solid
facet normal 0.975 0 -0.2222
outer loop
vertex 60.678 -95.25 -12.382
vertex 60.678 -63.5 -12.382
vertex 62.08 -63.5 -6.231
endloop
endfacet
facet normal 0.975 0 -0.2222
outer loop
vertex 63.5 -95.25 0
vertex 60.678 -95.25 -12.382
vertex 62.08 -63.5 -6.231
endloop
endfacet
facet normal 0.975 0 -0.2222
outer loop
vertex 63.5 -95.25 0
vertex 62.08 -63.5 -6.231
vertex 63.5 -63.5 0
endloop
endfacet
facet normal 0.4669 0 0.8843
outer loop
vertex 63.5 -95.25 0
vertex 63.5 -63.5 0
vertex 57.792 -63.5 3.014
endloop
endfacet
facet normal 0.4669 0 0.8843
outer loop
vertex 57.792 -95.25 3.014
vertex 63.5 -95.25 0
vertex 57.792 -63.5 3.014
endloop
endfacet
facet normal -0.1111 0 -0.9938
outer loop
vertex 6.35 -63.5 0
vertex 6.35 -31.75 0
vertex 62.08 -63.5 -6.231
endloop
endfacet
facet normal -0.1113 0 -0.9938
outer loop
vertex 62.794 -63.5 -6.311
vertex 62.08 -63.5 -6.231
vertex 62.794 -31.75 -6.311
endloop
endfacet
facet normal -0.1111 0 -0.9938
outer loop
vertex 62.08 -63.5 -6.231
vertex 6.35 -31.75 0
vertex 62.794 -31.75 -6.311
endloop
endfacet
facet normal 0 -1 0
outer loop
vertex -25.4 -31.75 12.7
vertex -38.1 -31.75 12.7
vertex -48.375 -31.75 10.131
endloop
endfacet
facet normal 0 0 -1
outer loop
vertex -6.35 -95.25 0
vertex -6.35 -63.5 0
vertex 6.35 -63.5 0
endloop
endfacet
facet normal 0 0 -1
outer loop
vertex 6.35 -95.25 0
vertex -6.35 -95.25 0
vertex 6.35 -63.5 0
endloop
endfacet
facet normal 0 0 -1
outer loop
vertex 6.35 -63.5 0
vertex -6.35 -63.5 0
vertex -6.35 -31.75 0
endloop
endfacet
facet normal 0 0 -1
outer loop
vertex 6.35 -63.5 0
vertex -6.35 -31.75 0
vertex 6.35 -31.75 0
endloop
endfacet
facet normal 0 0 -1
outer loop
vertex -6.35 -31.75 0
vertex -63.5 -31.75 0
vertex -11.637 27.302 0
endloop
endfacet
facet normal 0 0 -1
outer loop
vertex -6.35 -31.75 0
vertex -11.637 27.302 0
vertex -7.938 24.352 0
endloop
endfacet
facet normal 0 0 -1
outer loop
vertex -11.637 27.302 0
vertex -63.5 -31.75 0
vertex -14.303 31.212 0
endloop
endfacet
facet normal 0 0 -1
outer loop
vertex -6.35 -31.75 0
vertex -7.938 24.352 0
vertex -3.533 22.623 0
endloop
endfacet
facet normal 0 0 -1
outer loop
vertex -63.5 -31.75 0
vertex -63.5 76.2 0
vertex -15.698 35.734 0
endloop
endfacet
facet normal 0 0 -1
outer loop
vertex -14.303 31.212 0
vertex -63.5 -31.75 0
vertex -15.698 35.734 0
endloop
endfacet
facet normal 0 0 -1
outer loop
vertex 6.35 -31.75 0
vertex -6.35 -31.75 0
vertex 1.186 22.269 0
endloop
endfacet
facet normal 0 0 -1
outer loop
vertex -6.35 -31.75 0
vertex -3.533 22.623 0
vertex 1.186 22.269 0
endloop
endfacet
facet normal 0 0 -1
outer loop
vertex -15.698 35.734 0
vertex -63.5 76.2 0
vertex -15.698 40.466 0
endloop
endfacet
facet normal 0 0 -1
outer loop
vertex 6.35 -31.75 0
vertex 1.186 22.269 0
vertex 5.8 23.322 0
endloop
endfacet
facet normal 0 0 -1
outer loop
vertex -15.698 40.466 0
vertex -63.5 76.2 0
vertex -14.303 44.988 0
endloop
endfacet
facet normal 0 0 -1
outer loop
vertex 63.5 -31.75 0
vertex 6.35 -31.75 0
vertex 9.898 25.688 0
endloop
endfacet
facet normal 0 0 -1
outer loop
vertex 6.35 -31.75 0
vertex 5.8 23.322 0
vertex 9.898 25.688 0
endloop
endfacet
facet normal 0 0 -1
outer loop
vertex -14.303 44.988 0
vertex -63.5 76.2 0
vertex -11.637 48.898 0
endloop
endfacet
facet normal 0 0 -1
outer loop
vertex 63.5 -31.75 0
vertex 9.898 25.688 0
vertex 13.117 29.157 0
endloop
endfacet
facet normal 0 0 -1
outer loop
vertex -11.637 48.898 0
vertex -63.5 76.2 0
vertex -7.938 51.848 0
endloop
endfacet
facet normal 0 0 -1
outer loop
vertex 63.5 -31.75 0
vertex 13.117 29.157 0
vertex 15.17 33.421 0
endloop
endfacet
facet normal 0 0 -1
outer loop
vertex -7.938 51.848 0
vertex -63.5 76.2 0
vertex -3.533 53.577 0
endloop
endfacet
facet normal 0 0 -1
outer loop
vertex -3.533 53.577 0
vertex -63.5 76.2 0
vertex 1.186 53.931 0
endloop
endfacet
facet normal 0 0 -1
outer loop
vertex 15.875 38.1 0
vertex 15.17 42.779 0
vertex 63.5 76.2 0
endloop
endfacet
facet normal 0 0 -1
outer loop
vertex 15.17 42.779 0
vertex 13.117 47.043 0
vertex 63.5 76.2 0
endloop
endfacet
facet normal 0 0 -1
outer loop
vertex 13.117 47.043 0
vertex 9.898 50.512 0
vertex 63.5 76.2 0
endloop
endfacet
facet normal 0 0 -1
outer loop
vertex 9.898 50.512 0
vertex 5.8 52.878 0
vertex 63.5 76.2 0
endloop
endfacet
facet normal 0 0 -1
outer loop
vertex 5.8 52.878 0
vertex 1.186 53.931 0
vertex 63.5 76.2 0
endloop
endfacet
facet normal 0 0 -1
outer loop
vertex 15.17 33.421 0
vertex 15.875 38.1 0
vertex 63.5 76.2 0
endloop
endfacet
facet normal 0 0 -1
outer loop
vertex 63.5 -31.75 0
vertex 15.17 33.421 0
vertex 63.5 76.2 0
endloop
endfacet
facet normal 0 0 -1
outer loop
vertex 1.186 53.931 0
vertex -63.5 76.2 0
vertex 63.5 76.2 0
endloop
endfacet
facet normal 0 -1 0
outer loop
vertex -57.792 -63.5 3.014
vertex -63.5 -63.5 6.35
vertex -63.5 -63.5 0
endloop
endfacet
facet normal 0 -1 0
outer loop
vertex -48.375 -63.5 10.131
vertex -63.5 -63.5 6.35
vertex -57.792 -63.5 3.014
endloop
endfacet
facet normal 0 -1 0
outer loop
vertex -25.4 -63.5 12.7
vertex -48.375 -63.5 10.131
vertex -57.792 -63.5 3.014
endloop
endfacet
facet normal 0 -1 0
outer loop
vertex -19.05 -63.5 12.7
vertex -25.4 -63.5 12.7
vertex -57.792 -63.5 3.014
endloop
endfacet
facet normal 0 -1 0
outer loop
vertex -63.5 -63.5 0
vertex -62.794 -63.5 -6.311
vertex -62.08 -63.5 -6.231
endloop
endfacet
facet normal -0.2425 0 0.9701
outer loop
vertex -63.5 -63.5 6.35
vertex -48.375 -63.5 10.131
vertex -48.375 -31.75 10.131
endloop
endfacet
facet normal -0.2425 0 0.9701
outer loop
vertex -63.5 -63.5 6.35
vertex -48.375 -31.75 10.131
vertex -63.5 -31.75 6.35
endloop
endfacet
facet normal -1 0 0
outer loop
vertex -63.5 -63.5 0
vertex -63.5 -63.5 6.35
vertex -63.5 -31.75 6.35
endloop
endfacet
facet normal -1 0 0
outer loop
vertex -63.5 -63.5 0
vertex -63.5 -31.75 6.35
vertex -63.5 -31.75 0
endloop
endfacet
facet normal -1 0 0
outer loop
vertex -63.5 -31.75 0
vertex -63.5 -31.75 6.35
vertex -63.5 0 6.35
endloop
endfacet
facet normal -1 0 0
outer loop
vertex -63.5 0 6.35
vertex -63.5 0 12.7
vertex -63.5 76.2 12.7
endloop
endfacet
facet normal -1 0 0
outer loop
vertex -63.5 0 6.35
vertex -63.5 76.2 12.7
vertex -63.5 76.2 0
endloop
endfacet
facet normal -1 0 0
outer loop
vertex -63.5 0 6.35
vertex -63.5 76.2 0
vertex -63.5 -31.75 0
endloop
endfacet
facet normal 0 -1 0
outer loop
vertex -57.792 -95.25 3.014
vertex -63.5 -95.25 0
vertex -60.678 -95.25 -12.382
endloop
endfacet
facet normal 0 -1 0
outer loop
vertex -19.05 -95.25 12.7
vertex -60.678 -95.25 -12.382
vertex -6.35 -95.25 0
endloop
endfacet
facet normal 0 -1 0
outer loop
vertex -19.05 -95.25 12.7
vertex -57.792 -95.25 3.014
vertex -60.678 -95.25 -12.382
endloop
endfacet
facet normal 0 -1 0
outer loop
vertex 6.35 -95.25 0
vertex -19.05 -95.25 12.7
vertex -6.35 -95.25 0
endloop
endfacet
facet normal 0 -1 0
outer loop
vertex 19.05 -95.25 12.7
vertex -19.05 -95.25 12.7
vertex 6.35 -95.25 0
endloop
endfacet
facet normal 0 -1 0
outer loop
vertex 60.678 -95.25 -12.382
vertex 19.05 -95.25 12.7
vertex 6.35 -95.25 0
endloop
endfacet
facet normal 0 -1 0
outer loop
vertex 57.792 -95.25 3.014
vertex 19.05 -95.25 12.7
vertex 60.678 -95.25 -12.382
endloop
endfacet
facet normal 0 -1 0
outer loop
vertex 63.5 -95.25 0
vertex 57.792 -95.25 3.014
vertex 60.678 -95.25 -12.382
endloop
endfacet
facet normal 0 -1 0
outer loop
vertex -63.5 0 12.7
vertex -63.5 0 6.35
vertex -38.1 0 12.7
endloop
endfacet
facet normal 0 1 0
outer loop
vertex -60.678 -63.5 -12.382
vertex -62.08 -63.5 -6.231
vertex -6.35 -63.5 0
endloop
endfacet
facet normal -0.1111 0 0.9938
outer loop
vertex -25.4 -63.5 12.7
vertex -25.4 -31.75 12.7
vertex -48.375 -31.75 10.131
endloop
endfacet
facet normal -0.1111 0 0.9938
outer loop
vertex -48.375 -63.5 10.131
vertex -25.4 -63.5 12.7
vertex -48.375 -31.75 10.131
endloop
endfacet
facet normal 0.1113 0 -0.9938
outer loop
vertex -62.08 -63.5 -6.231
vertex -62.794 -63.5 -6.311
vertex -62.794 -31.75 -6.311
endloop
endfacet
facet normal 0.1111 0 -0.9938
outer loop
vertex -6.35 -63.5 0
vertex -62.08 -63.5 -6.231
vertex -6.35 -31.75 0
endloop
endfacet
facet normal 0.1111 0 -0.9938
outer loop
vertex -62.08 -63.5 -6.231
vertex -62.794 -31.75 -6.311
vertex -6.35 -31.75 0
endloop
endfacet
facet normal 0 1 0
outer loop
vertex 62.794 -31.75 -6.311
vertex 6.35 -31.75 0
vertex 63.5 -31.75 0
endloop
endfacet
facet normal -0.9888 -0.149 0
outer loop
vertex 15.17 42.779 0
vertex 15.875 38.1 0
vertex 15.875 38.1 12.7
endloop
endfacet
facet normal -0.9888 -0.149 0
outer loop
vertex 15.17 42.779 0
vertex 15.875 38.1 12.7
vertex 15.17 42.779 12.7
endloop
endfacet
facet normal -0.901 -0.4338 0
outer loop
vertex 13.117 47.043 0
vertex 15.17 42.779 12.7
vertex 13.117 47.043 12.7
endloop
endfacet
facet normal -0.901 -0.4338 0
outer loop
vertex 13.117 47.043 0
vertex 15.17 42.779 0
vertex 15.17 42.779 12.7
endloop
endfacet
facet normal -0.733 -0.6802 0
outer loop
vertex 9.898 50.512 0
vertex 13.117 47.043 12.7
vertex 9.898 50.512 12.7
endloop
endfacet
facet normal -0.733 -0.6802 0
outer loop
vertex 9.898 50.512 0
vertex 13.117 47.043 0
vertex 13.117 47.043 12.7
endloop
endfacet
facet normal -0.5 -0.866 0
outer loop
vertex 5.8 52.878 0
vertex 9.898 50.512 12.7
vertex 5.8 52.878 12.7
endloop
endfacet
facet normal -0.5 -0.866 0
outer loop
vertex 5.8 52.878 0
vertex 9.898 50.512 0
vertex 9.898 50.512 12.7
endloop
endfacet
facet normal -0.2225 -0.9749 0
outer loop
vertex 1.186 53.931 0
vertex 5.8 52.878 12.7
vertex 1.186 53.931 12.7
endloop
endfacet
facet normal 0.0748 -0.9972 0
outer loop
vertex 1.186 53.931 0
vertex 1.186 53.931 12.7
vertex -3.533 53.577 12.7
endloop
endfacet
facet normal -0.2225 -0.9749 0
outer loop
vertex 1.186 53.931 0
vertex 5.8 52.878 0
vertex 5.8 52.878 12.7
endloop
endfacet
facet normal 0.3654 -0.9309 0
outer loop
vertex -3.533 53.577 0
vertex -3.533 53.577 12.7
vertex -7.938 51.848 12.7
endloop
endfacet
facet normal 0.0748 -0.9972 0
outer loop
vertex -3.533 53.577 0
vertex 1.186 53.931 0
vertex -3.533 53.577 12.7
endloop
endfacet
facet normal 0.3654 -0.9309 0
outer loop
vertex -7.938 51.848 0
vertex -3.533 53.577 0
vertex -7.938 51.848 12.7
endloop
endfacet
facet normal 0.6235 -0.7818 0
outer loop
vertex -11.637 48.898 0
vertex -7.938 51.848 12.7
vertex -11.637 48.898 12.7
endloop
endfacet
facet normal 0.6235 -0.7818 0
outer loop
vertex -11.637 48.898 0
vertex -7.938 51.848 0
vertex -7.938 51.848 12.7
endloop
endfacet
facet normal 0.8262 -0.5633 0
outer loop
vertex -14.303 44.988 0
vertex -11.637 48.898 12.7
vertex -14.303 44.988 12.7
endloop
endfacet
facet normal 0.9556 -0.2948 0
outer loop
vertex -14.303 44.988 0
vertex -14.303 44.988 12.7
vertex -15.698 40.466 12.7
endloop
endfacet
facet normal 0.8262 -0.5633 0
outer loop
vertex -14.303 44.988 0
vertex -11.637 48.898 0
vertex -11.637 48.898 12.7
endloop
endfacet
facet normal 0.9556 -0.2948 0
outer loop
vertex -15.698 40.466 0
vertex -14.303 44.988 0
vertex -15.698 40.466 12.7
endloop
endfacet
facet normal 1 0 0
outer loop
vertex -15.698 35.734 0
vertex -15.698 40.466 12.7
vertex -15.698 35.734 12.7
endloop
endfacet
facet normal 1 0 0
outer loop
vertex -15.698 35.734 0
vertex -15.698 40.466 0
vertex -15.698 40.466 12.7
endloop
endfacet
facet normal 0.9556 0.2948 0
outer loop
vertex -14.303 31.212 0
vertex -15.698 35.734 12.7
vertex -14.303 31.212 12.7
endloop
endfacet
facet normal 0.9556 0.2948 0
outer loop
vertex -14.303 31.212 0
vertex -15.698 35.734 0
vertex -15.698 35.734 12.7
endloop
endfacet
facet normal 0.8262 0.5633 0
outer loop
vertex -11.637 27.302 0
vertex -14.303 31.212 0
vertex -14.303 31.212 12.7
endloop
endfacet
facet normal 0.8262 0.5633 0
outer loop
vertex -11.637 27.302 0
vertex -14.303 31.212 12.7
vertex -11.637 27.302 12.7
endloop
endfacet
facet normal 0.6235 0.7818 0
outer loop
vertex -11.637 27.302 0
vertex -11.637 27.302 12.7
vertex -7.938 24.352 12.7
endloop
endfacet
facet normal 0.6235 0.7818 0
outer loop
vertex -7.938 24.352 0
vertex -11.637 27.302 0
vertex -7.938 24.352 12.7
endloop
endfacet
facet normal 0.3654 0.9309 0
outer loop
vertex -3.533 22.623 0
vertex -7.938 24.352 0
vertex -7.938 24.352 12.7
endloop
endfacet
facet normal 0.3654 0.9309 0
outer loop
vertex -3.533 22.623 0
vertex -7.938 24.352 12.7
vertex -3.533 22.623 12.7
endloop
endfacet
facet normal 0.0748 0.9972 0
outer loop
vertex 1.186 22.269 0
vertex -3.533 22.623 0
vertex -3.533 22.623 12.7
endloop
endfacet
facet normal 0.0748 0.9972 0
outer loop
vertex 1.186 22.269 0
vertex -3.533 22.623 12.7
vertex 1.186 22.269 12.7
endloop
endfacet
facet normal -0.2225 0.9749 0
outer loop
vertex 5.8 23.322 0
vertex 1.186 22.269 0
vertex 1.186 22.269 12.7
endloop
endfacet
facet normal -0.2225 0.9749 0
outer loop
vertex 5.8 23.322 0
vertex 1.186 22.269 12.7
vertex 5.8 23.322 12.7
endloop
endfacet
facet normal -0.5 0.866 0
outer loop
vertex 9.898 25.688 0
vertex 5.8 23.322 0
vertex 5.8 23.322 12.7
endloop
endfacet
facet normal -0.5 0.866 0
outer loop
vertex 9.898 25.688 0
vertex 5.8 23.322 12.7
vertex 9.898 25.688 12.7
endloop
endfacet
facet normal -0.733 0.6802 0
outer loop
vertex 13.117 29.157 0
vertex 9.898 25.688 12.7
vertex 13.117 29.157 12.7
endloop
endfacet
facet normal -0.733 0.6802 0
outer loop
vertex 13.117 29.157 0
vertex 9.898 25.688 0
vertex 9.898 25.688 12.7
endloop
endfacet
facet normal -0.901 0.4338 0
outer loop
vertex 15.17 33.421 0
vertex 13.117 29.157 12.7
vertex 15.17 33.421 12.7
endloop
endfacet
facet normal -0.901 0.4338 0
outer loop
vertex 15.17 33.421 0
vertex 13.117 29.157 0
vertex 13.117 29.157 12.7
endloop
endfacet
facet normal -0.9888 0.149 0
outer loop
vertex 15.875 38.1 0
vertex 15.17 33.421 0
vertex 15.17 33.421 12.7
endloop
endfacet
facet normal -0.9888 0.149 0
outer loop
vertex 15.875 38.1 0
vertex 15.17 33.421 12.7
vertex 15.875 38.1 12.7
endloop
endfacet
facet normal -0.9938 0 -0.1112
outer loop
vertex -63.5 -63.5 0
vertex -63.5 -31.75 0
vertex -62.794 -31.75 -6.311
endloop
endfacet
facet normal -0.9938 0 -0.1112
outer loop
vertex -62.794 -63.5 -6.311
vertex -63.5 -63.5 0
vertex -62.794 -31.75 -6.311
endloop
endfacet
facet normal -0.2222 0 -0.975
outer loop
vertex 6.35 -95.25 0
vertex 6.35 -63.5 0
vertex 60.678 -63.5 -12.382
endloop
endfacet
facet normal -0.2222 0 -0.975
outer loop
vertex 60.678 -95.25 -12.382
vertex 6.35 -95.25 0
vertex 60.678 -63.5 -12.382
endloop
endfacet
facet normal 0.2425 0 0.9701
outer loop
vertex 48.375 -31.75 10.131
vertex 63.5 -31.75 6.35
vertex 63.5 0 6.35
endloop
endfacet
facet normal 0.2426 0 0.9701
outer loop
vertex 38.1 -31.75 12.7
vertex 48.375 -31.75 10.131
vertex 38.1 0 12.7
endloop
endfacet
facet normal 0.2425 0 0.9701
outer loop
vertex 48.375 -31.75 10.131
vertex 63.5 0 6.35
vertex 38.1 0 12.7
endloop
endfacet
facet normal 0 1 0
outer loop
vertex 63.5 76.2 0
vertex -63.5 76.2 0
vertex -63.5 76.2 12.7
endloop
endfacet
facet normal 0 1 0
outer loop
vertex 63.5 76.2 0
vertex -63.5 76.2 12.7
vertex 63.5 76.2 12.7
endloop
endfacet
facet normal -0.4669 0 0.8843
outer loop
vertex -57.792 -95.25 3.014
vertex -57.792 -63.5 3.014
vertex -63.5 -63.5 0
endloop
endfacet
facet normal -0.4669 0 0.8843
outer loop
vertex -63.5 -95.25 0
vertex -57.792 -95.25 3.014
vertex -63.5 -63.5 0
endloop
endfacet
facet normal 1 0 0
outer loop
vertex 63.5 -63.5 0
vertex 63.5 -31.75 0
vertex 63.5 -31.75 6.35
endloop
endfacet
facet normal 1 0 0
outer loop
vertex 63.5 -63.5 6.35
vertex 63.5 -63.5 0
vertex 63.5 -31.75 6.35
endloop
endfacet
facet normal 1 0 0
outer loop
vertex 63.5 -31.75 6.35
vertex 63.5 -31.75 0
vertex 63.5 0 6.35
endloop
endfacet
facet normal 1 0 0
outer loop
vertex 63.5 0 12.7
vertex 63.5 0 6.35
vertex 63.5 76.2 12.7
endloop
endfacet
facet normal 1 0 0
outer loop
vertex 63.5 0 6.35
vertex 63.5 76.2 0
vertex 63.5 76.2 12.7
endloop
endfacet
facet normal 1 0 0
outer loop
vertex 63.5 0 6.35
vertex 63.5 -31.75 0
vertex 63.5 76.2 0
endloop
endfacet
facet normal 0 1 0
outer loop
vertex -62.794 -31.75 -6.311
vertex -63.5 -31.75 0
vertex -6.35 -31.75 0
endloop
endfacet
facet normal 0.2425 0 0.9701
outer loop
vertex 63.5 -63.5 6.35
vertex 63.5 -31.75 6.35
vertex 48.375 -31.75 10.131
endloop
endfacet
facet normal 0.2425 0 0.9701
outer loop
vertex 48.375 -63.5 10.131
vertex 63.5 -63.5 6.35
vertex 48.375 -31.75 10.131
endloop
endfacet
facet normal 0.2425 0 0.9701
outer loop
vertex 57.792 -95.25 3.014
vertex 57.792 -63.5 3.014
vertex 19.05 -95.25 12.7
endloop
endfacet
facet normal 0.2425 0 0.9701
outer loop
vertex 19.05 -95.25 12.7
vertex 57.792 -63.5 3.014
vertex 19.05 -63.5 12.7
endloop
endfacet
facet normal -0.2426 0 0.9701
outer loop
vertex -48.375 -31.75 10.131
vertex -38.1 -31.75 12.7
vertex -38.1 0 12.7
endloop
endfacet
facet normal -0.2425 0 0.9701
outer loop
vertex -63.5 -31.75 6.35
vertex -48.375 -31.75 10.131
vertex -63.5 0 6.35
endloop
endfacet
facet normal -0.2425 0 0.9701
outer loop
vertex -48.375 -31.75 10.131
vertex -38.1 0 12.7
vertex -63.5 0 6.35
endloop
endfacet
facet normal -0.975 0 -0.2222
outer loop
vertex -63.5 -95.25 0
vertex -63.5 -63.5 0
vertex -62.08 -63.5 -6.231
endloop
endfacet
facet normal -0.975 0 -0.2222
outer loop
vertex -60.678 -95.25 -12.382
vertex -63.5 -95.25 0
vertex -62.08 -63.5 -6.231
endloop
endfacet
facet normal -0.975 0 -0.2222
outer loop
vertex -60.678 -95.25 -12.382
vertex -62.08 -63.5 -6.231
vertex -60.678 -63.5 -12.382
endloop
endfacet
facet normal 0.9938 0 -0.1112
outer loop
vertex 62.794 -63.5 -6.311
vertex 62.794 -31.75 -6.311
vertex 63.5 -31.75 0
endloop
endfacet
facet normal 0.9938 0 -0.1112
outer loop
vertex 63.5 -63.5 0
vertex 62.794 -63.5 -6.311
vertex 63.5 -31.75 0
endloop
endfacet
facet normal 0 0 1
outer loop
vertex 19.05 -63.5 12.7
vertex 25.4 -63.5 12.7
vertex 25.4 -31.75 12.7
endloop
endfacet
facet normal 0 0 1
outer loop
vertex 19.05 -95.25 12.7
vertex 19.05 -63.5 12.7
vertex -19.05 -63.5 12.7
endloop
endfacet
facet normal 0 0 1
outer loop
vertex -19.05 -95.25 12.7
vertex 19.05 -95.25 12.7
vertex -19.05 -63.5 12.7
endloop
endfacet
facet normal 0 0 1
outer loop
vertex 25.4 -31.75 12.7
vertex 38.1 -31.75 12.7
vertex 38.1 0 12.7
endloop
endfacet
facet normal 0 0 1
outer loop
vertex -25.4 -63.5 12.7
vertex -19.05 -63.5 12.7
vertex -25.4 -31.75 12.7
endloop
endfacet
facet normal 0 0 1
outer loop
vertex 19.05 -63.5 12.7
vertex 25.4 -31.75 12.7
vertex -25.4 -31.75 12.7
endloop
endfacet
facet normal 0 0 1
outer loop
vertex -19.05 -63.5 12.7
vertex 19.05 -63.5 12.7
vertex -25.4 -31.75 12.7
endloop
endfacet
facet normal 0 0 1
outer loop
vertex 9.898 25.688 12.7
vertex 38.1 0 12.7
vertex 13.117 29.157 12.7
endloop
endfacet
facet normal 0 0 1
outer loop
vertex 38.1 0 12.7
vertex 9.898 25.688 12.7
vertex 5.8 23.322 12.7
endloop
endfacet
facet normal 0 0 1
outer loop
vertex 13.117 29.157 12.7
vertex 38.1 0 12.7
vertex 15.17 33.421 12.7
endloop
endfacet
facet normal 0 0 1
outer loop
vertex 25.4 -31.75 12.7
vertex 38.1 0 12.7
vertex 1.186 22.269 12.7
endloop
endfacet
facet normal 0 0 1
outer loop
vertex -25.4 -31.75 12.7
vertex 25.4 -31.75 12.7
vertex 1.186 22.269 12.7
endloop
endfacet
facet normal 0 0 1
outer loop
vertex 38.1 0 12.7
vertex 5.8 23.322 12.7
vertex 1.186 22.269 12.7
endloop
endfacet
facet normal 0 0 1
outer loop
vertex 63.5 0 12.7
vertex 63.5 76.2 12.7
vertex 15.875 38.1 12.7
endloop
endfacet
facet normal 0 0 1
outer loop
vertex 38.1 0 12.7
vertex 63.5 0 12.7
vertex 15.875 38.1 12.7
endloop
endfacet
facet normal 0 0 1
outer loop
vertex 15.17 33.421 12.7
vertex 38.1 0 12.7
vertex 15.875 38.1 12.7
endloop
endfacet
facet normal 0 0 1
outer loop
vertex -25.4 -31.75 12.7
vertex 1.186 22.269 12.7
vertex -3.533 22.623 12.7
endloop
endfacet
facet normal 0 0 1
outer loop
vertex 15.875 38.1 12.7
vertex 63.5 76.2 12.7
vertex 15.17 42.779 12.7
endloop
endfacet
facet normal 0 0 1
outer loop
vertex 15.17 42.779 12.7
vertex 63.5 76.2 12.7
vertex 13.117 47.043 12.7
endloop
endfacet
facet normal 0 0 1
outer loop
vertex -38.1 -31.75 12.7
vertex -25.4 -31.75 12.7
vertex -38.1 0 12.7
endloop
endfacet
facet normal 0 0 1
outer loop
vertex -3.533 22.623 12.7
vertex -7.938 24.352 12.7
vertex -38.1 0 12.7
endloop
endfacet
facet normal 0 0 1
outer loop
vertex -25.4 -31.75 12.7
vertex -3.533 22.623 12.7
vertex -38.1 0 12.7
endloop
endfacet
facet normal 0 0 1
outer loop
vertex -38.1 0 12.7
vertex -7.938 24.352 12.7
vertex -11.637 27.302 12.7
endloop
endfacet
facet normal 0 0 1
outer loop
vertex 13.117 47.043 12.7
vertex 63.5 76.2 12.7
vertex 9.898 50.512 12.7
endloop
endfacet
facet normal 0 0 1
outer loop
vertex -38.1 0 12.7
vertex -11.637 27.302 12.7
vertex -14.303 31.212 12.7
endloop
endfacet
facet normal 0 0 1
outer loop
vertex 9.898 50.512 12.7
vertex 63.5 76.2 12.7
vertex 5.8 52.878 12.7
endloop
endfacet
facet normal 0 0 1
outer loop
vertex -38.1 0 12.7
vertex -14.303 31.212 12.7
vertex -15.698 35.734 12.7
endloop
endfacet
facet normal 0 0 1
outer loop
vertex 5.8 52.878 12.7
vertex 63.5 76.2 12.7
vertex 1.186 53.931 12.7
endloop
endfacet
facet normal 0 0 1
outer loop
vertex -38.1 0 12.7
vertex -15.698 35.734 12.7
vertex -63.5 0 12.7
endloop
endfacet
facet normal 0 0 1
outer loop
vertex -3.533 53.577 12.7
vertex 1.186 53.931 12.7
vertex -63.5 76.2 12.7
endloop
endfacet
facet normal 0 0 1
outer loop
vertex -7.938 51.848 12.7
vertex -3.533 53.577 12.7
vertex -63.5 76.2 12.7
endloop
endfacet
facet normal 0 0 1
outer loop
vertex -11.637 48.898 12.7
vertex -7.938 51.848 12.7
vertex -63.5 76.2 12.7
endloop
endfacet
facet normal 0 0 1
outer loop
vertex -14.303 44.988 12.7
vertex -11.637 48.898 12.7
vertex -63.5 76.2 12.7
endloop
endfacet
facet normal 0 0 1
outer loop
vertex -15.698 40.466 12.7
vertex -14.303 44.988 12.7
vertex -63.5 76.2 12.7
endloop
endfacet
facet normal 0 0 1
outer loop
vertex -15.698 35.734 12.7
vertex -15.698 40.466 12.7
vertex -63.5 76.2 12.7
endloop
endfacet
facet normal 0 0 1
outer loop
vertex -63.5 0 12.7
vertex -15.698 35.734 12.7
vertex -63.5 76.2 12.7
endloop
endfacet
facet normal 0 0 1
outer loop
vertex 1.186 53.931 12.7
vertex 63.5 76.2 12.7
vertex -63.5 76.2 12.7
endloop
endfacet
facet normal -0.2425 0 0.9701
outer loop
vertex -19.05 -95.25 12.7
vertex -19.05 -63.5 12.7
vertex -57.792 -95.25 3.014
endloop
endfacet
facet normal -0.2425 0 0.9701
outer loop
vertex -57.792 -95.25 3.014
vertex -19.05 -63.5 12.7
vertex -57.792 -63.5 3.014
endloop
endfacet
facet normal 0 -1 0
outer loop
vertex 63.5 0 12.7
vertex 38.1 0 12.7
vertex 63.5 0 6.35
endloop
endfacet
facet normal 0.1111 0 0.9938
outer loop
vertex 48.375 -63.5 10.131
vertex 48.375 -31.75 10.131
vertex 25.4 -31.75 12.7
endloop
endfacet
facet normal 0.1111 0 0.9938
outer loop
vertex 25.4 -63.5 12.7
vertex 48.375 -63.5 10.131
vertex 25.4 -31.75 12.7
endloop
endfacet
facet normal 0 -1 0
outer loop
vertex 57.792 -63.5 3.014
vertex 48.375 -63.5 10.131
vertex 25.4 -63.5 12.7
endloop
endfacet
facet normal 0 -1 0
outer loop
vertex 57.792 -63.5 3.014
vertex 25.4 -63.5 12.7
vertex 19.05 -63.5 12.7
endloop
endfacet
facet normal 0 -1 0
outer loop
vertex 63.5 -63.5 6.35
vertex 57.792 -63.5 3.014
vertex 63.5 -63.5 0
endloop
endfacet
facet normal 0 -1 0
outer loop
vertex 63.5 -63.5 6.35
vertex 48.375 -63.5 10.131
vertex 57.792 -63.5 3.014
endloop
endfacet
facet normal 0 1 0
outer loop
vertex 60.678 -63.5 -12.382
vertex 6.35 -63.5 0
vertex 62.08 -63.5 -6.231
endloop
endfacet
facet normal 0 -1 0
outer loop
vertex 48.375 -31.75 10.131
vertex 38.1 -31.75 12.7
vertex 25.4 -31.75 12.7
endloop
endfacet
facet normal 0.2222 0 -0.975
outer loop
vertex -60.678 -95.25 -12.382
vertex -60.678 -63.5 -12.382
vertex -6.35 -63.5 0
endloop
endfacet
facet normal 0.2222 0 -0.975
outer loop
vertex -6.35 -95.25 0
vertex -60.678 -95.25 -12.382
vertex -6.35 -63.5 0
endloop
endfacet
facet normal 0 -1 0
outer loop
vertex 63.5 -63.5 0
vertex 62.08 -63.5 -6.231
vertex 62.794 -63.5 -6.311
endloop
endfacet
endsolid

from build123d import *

# Parameters (mm, degrees)
F0_W     = 127
F0_H     = 76.2
F0_R     = 15.875
F1_DEPTH = 12.7
F3_DEPTH = 31.75
F5_START = 31.75
F5_DEPTH = 31.75
F7_START = 63.5
F7_DEPTH = 31.75


with BuildPart() as f1:
    # F0 (on Top) → F1 (new body)
    with BuildSketch(Plane.XY):
        with Locations((0, 38.1)):
            Rectangle(F0_W, F0_H)
        with Locations((0, 38.1)):
            Circle(F0_R, mode=Mode.SUBTRACT)
    extrude(amount=F1_DEPTH)

    # F2 (on Front) → F3 (join)
    with BuildSketch(Plane.XZ):
        Polygon((-6.35, 0), (0, 0), (6.35, 0), (63.5, 0), (63.5, 6.35), (38.1, 12.7), (-38.1, 12.7), (-63.5, 6.35), (-63.5, 0), align=None)
    extrude(amount=F3_DEPTH)

    # F4 (on Front) → F5 (join)
    with BuildSketch(Plane.XZ.offset(F5_START)):
        Polygon((-6.35, 0), (0, 0), (6.35, 0), (62.7944444444, -6.3106807365), (63.5, 0), (63.5, 6.35), (48.3745158286, 10.1313710429), (25.4, 12.7), (-25.4, 12.7), (-48.3745158286, 10.1313710429), (-63.5, 6.35), (-63.5, 0), (-62.7944444444, -6.3106807365), align=None)
    extrude(amount=F5_DEPTH)

    # F6 (on Front) → F7 (join)
    with BuildSketch(Plane.XZ.offset(F7_START)):
        Polygon((-6.35, 0), (0, 0), (6.35, 0), (60.6777777778, -12.3824497467), (63.5, 0), (57.7921046631, 3.0144738342), (19.05, 12.7), (-19.05, 12.7), (-57.7921046631, 3.0144738342), (-63.5, 0), (-60.6777777778, -12.3824497467), align=None)
    extrude(amount=F7_DEPTH)


solid = f1.part
